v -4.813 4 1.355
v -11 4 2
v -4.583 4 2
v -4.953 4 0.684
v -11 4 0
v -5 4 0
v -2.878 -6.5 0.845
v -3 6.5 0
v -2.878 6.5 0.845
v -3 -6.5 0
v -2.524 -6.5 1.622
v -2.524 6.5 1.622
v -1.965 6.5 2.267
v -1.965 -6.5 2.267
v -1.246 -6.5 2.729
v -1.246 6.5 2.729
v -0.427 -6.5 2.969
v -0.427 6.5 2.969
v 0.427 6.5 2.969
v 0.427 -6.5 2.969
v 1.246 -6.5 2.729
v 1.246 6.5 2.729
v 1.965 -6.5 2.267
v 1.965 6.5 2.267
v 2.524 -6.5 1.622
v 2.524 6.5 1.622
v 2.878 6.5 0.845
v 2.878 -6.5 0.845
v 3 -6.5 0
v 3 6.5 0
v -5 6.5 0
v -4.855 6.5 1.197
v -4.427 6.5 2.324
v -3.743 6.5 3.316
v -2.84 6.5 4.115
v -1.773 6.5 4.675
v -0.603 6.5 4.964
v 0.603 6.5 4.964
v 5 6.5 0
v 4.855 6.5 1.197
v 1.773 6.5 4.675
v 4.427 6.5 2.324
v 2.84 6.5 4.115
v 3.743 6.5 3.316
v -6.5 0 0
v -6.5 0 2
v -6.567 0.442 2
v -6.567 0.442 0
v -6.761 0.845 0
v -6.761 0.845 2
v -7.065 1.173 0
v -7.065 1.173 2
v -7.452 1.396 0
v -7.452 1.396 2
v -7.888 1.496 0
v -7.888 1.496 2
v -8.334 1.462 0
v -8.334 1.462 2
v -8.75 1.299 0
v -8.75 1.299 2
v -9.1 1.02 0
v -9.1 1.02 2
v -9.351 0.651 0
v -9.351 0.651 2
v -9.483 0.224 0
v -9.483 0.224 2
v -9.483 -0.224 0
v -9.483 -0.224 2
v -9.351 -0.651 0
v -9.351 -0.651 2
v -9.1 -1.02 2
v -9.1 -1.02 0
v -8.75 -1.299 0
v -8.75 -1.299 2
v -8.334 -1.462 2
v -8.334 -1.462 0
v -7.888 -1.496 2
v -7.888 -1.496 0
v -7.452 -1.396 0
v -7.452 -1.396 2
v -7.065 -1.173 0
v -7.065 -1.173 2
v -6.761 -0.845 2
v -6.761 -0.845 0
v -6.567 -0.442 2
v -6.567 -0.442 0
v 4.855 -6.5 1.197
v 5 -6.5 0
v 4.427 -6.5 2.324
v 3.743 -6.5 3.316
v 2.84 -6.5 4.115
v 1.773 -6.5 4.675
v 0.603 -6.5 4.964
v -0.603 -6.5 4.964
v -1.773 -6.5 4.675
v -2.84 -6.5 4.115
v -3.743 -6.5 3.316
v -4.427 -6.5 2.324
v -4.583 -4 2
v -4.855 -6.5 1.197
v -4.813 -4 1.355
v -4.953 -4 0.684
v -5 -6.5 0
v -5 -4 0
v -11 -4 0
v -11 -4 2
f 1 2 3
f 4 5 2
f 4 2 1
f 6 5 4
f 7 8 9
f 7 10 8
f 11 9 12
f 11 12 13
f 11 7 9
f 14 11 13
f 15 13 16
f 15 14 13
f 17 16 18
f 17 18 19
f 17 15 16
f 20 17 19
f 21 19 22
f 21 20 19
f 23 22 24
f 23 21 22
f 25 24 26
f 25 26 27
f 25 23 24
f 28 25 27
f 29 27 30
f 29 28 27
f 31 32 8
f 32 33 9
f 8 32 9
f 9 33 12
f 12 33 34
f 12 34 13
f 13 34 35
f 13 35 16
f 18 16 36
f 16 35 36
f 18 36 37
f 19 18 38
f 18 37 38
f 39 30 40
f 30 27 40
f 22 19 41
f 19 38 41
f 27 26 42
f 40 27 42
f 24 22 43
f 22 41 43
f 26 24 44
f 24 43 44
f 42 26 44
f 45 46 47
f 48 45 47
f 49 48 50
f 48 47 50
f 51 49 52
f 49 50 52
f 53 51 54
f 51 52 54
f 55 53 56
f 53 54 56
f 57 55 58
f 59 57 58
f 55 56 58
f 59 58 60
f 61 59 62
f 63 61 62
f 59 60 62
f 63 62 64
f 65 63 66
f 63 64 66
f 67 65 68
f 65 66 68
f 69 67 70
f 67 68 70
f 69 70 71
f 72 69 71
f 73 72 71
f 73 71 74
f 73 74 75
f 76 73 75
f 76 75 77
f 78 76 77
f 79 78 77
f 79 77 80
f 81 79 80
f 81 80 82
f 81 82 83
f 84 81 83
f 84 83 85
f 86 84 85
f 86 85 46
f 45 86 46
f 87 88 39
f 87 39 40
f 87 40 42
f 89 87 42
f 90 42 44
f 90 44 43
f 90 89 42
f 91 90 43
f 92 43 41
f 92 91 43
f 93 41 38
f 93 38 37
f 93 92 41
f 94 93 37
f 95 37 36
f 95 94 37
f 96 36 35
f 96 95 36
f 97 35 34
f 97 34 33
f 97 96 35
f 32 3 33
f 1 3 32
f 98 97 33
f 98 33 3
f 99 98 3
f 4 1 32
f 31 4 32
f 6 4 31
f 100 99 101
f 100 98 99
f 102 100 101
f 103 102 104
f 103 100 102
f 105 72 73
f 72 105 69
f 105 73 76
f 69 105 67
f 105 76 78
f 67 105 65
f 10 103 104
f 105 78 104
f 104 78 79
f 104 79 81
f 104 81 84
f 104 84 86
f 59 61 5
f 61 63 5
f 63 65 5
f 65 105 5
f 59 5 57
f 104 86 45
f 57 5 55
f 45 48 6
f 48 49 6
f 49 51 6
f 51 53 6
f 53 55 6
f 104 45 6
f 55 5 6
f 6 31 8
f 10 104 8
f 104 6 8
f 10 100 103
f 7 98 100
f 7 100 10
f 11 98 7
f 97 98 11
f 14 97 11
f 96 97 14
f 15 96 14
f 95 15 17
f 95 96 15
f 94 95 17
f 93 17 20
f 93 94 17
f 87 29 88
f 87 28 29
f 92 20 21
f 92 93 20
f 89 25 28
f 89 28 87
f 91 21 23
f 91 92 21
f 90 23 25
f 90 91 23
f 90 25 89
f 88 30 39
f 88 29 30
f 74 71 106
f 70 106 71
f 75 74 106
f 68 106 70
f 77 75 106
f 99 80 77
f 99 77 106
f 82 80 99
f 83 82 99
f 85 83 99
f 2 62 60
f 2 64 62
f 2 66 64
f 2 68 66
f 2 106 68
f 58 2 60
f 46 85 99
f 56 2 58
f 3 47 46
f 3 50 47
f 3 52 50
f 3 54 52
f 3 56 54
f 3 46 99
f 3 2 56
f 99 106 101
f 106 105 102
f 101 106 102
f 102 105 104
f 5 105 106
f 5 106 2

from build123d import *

# Parameters (mm, degrees)
F1_DEPTH = 6.5
F2_W     = 8
F2_H     = 8
F3_DEPTH = 2
F4_R     = 1.5
F5_DEPTH = 25


with BuildPart() as f1:
    # F0 (on Front) → F1 (new body, symmetric)
    with BuildSketch(Plane.XZ):
        with BuildLine():
            Line((3, 0), (5, 0))
            ThreePointArc((5, 0), (0, 5), (-5, 0))
            Line((-5, 0), (-3, 0))
            ThreePointArc((-3, 0), (0, 3), (3, 0))
        make_face()
    extrude(amount=F1_DEPTH, both=True)

    # F2 (on Top) → F3 (join)
    with BuildSketch(Plane.XY):
        with Locations((-7, 0)):
            Rectangle(F2_W, F2_H)
    extrude(amount=F3_DEPTH)

    # F4 (on face) → F5 (cut)
    with BuildSketch(Plane.XY.offset(2)):
        with Locations((-8, 0)):
            Circle(F4_R)
    extrude(amount=-F5_DEPTH, mode=Mode.SUBTRACT)


solid = f1.part
